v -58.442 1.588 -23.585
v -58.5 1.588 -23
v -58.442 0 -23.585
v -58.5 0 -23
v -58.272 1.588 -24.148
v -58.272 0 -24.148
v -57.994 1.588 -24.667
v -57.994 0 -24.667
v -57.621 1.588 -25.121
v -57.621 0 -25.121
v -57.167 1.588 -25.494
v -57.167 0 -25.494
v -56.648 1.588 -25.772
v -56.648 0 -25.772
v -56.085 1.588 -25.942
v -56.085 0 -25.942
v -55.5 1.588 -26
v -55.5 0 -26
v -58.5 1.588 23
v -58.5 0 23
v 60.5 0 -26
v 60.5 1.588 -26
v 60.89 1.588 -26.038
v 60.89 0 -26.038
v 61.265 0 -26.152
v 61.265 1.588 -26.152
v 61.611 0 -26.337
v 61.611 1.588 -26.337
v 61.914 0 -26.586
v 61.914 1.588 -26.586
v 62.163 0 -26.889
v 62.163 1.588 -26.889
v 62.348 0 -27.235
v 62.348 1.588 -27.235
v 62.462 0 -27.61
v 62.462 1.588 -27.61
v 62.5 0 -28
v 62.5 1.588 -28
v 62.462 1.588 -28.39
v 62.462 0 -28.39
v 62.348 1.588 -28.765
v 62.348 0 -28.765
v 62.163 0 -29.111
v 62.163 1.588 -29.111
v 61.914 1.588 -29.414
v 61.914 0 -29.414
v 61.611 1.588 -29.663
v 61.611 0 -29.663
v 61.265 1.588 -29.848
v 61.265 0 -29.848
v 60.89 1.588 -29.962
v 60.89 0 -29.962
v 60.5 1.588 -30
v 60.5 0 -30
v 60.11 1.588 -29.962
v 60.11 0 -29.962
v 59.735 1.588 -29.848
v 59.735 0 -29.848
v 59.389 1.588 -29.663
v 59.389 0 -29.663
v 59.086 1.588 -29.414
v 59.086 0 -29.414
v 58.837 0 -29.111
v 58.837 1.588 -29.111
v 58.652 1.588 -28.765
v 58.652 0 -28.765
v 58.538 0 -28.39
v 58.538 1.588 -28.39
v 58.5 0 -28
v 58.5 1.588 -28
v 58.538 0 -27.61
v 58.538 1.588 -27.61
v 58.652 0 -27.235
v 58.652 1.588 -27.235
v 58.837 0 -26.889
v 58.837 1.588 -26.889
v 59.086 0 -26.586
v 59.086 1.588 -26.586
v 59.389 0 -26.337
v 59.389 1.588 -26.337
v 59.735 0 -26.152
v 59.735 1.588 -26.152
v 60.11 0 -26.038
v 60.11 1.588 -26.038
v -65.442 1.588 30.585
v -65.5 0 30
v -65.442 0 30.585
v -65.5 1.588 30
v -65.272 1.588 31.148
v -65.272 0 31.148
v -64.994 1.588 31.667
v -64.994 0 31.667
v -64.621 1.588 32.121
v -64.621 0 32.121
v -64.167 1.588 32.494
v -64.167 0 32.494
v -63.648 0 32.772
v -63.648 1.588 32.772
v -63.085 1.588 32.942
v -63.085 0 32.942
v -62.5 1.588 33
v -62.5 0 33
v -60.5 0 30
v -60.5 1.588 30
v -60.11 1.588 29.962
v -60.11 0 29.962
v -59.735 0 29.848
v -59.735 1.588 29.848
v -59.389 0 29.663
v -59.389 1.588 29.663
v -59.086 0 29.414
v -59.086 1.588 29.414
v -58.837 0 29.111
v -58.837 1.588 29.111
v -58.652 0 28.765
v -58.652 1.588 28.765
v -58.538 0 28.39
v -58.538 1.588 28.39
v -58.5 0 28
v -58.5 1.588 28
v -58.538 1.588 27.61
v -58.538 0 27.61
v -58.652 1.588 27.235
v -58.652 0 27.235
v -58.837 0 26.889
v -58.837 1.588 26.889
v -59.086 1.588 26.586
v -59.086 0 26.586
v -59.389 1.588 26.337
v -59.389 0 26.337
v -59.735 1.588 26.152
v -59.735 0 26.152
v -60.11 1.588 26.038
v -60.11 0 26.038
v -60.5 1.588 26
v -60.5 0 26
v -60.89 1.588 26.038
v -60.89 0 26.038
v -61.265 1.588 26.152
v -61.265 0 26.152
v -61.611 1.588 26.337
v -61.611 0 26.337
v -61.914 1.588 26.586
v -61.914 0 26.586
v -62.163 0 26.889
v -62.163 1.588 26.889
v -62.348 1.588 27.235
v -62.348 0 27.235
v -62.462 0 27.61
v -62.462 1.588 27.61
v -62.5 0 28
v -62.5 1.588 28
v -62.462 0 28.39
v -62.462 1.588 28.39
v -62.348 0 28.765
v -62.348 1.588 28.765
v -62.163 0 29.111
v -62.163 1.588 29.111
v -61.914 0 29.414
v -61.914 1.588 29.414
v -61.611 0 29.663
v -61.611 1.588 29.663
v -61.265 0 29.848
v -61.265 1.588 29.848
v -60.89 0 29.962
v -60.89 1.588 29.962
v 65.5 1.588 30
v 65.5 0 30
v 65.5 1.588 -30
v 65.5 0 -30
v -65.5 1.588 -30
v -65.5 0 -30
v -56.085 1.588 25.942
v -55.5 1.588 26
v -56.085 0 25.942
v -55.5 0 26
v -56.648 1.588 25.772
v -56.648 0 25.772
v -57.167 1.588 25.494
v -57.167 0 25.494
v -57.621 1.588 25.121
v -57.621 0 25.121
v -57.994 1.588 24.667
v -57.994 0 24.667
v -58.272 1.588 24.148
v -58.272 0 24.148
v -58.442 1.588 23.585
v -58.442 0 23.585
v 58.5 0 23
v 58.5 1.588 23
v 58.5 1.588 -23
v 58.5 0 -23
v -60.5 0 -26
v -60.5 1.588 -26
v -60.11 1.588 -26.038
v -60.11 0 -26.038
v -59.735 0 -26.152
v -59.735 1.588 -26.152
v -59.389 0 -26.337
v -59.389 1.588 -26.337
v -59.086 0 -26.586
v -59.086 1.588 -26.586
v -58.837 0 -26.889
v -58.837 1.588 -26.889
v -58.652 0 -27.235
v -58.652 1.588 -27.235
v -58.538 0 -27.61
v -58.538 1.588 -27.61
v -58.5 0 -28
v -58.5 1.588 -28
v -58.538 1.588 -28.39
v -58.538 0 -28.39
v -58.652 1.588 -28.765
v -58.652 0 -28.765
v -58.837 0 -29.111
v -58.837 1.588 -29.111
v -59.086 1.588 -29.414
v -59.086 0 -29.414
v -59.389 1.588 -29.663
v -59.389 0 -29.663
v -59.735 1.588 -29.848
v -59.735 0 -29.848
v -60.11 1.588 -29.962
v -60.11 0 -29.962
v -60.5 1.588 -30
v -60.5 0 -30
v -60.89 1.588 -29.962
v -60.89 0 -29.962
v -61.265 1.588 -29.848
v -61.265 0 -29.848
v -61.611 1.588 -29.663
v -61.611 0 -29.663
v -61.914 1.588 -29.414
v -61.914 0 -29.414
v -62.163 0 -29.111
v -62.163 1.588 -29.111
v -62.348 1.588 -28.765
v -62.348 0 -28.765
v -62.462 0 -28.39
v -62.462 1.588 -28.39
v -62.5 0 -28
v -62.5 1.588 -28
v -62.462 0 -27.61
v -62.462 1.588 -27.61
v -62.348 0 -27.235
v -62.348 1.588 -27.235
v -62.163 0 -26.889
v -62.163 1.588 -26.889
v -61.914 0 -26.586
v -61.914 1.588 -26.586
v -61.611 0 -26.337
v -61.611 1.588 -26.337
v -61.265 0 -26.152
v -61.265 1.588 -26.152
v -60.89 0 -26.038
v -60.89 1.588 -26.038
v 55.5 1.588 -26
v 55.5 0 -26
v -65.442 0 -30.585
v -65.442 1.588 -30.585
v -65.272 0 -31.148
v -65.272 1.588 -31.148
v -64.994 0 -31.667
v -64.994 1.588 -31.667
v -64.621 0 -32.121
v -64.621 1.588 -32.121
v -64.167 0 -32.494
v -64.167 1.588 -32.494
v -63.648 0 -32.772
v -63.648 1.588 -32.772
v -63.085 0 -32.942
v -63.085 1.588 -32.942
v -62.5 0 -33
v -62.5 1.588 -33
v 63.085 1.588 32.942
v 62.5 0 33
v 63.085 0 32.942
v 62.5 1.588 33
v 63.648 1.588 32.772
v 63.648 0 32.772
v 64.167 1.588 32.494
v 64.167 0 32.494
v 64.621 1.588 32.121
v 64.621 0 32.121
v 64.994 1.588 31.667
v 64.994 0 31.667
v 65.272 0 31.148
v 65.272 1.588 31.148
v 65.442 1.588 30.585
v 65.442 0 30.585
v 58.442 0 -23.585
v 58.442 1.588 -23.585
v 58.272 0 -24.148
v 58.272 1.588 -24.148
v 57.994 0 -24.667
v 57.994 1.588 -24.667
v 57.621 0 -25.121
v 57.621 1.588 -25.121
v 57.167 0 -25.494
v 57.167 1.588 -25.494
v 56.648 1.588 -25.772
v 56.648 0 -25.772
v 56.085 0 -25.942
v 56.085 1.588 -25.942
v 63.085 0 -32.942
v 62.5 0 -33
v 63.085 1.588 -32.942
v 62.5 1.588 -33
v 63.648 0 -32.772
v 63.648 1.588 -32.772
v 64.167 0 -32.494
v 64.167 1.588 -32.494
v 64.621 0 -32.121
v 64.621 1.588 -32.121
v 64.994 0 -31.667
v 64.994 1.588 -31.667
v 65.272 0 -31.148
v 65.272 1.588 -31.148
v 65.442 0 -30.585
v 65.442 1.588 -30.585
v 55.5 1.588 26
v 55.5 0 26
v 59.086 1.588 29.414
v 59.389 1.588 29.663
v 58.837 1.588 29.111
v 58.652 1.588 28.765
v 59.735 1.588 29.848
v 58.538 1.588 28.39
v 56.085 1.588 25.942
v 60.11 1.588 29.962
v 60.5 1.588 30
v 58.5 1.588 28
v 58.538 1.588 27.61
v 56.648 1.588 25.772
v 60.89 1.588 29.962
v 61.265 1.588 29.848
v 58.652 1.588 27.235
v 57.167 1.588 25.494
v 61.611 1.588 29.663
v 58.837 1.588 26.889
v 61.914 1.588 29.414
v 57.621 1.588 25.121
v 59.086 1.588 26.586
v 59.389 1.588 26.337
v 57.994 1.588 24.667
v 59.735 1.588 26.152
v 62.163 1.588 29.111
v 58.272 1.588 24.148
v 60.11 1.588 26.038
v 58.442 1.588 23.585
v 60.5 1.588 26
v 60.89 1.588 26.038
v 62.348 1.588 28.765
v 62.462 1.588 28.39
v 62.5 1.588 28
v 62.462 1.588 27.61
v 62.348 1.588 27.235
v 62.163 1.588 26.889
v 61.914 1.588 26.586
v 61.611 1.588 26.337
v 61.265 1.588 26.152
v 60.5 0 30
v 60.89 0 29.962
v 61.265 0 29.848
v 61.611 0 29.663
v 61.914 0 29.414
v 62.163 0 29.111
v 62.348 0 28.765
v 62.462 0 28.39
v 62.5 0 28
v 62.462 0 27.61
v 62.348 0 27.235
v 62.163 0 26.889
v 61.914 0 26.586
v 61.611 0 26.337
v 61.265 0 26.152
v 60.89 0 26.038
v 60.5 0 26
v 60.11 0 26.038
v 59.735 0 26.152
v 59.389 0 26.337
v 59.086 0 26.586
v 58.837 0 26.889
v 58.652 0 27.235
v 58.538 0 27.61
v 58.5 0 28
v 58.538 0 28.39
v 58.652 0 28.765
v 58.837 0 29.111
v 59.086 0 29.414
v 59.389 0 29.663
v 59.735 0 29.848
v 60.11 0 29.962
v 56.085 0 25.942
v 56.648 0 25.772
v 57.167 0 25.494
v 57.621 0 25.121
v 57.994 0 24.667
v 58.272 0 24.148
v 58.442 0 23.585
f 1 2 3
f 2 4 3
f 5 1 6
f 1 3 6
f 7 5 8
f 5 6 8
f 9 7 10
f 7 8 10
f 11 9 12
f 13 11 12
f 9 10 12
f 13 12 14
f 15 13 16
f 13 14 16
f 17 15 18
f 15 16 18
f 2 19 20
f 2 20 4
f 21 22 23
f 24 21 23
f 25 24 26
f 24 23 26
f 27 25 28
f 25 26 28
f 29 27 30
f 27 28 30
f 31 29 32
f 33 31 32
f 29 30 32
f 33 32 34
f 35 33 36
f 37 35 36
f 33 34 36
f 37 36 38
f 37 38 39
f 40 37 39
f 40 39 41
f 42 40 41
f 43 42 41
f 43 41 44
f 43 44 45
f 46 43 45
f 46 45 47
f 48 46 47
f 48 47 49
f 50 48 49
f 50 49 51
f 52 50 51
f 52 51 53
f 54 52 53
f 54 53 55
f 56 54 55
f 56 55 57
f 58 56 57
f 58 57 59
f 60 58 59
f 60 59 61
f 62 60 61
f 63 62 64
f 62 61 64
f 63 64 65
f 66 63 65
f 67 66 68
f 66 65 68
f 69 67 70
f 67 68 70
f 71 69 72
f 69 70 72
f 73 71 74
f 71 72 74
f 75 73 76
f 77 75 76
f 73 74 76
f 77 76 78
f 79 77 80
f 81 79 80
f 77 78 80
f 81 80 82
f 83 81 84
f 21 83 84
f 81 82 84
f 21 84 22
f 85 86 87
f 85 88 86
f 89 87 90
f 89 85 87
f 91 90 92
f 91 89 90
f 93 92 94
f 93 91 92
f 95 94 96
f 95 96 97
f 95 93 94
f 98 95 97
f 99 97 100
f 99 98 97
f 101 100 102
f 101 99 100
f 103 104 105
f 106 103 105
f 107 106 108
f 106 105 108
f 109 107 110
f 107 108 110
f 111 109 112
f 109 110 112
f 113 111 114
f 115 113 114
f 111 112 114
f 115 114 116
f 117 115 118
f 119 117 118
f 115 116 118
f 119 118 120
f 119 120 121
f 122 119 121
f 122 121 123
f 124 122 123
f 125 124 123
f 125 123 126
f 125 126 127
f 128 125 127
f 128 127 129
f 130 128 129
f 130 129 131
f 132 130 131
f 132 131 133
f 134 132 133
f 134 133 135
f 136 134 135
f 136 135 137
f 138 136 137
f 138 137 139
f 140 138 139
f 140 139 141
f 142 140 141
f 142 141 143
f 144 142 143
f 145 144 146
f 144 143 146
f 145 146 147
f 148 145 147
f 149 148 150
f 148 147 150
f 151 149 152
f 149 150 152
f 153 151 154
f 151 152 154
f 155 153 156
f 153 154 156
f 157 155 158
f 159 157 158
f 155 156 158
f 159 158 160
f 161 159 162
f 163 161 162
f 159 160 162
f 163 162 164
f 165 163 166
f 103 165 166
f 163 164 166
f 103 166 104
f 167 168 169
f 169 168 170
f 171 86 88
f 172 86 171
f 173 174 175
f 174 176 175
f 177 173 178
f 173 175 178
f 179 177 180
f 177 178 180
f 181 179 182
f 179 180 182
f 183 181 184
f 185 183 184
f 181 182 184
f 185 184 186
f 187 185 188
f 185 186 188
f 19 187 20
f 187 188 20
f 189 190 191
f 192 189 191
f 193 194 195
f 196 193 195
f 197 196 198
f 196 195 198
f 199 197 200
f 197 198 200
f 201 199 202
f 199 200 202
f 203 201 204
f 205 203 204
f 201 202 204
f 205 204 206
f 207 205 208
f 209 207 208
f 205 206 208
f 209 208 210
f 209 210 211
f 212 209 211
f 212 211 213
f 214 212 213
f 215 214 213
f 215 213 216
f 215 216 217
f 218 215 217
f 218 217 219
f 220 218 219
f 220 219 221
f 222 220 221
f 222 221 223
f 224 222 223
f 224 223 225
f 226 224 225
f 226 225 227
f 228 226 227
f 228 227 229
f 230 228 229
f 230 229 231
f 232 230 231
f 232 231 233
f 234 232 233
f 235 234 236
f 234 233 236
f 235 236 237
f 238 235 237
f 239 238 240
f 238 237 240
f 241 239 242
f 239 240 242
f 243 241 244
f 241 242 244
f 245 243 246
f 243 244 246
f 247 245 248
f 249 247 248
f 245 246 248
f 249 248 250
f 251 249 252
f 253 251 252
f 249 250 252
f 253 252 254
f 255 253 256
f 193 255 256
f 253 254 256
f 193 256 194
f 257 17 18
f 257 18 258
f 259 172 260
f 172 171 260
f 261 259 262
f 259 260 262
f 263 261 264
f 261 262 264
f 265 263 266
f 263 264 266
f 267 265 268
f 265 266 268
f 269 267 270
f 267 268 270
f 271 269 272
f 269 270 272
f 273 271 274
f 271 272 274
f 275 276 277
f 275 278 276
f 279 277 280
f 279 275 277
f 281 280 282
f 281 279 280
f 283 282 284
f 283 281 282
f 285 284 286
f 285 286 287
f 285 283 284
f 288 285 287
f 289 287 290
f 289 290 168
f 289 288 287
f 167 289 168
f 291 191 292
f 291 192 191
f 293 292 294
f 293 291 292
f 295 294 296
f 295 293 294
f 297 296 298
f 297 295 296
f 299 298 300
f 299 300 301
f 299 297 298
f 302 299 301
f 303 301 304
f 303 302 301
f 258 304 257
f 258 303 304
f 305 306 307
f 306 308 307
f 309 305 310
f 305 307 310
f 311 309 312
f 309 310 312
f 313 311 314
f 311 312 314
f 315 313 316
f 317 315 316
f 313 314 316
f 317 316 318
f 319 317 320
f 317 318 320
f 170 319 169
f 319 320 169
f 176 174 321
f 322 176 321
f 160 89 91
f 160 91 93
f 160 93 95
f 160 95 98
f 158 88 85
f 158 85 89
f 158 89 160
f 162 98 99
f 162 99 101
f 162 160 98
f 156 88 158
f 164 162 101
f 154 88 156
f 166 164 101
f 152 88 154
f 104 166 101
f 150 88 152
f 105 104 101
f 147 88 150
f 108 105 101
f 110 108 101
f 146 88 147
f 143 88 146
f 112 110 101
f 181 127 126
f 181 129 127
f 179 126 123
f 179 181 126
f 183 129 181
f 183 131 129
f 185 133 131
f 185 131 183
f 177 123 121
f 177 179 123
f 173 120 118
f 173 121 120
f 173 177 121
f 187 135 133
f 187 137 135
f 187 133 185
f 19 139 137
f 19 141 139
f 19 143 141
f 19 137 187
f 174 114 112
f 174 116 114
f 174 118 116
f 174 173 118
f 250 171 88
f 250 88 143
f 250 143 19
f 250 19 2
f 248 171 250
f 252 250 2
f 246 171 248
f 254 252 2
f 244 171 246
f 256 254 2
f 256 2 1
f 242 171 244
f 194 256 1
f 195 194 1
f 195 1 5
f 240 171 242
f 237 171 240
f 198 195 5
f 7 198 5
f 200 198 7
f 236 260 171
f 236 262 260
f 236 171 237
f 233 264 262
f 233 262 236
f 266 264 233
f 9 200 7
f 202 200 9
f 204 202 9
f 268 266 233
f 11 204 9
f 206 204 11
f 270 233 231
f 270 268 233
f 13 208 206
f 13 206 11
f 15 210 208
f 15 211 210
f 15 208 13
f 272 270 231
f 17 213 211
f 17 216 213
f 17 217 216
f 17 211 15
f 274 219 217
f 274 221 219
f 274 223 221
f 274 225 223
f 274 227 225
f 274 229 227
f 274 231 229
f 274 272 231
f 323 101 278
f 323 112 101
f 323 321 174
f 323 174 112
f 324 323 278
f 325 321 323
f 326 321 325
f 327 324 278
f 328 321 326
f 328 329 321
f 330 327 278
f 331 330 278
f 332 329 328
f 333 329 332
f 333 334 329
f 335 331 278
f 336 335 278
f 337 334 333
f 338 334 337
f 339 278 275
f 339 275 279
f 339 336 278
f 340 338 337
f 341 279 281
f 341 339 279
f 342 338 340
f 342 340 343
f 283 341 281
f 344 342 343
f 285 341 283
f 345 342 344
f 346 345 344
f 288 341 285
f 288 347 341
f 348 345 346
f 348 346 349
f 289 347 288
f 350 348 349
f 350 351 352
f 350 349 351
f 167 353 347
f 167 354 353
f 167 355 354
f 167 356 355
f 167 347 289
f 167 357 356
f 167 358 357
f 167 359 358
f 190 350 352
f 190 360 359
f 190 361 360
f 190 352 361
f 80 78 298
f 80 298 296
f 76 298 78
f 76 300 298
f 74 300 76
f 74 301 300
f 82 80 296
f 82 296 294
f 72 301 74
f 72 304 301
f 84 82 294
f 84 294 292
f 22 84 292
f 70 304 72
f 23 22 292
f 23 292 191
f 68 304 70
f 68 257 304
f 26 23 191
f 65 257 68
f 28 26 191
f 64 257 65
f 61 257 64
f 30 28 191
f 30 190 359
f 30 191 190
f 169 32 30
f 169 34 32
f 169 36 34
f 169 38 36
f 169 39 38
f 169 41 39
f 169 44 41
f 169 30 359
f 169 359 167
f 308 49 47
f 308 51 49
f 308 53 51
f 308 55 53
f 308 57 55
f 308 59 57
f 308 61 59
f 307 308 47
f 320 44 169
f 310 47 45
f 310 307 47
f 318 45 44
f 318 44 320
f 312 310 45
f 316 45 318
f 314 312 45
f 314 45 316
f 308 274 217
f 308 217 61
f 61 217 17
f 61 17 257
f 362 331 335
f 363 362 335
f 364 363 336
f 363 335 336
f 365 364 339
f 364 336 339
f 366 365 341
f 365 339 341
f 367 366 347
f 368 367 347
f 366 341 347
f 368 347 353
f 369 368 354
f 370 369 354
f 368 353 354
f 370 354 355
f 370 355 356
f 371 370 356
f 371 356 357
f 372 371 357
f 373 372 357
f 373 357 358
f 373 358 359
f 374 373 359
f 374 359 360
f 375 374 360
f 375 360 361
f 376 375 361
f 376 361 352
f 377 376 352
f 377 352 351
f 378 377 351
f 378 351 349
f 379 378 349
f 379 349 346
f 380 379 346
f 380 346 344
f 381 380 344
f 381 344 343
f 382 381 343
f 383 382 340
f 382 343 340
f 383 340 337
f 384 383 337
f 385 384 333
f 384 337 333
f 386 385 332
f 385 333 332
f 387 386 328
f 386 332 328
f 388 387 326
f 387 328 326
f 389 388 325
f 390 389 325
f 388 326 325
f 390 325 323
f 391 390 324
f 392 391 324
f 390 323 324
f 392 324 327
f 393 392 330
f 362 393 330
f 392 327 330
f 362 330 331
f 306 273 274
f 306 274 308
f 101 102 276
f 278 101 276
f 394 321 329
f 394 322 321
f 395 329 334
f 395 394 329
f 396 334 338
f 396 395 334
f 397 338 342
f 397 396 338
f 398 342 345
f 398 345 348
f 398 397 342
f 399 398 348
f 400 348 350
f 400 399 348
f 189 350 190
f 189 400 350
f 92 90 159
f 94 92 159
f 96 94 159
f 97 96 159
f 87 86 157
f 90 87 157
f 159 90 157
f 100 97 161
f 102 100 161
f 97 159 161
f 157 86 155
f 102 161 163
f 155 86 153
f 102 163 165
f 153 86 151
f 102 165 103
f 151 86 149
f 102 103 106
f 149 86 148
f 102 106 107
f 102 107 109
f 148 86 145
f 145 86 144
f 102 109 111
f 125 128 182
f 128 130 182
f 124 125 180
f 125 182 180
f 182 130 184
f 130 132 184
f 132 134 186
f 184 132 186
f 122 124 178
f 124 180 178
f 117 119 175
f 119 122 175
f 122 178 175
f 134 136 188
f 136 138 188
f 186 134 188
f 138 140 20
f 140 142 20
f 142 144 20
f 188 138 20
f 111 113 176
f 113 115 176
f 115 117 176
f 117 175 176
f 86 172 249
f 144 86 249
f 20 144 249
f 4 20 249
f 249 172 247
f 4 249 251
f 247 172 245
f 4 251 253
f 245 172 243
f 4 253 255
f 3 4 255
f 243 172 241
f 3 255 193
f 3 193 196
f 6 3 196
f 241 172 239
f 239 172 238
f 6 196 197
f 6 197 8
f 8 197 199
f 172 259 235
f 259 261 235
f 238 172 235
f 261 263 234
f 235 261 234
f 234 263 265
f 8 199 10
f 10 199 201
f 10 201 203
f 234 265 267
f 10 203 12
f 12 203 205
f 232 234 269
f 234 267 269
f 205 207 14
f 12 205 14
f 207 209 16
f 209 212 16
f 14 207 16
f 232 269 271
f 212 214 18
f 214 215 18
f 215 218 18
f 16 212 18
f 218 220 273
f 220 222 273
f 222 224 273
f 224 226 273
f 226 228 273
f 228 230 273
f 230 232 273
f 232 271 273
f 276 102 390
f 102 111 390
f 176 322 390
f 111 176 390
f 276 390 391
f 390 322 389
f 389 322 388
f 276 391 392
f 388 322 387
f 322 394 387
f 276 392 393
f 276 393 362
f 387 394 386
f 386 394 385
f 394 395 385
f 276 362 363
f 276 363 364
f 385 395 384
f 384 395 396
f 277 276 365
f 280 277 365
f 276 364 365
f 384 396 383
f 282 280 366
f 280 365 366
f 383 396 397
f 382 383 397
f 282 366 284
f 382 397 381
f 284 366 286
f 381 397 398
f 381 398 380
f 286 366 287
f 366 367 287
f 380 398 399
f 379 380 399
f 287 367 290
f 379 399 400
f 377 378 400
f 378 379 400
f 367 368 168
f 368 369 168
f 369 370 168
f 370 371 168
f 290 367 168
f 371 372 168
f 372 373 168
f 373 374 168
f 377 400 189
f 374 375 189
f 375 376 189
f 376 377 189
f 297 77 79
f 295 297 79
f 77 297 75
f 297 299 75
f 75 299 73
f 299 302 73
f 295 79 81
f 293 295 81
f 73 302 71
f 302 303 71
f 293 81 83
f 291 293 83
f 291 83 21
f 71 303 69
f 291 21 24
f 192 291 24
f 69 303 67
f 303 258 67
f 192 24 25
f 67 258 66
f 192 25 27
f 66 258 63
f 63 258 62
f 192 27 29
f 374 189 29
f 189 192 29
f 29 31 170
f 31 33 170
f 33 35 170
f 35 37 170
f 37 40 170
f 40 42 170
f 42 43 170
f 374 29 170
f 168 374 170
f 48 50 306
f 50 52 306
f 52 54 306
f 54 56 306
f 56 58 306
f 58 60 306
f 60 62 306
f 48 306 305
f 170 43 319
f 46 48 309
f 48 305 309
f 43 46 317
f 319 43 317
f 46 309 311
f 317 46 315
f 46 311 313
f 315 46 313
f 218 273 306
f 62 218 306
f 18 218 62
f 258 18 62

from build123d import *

# Parameters (mm, degrees)
SKETCH1_W           = 131
SKETCH1_H           = 66
BOSS_EXTRUDE1_DEPTH = 1.5875
SKETCH3_W           = 117
SKETCH3_H           = 52
CUT_EXTRUDE2_DEPTH  = 74.360549045
SKETCH4_R           = 2
CUT_EXTRUDE3_DEPTH  = 74.360549045
FILLET1_R           = 3


with BuildPart() as part:
    # Sketch1 → Boss-Extrude1 (new body)
    with BuildSketch(Plane(origin=(0, 0, 0), x_dir=(1, 0, 0), z_dir=(0, 1, 0))):
        Rectangle(SKETCH1_W, SKETCH1_H)
    extrude(amount=BOSS_EXTRUDE1_DEPTH)

    # Sketch3 → Cut-Extrude2 (cut, through all)
    with BuildSketch(Plane(origin=(0, 1.5875, 0), x_dir=(1, 0, 0), z_dir=(0, 1, 0))):
        Rectangle(SKETCH3_W, SKETCH3_H)
    extrude(amount=-CUT_EXTRUDE2_DEPTH, mode=Mode.SUBTRACT)

    # Sketch4 → Cut-Extrude3 (cut, through all)
    with BuildSketch(Plane(origin=(0, 1.5875, 0), x_dir=(1, 0, 0), z_dir=(0, 1, 0))):
        with Locations(Location((-60.5, 28, 0), (0, 0, 270))):
            Circle(SKETCH4_R)
        with Locations(Location((60.5, 28, 0), (0, 0, 270))):
            Circle(SKETCH4_R)
        with Locations(Location((60.5, -28, 0), (0, 0, 270))):
            Circle(SKETCH4_R)
        with Locations(Location((-60.5, -28, 0), (0, 0, 270))):
            Circle(SKETCH4_R)
    extrude(amount=-CUT_EXTRUDE3_DEPTH, mode=Mode.SUBTRACT)

    # Fillet1
    fillet1_edges = [part.edges().sort_by_distance(p)[0] for p in [
        (-58.5, 0.79375, 26),
        (-58.5, 0.79375, -26),
        (58.5, 0.79375, -26),
        (58.5, 0.79375, 26),
        (-65.5, 0.79375, -33),
        (65.5, 0.79375, -33),
        (65.5, 0.79375, 33),
        (-65.5, 0.79375, 33),
    ]]
    fillet(fillet1_edges, radius=FILLET1_R)


solid = part.part
